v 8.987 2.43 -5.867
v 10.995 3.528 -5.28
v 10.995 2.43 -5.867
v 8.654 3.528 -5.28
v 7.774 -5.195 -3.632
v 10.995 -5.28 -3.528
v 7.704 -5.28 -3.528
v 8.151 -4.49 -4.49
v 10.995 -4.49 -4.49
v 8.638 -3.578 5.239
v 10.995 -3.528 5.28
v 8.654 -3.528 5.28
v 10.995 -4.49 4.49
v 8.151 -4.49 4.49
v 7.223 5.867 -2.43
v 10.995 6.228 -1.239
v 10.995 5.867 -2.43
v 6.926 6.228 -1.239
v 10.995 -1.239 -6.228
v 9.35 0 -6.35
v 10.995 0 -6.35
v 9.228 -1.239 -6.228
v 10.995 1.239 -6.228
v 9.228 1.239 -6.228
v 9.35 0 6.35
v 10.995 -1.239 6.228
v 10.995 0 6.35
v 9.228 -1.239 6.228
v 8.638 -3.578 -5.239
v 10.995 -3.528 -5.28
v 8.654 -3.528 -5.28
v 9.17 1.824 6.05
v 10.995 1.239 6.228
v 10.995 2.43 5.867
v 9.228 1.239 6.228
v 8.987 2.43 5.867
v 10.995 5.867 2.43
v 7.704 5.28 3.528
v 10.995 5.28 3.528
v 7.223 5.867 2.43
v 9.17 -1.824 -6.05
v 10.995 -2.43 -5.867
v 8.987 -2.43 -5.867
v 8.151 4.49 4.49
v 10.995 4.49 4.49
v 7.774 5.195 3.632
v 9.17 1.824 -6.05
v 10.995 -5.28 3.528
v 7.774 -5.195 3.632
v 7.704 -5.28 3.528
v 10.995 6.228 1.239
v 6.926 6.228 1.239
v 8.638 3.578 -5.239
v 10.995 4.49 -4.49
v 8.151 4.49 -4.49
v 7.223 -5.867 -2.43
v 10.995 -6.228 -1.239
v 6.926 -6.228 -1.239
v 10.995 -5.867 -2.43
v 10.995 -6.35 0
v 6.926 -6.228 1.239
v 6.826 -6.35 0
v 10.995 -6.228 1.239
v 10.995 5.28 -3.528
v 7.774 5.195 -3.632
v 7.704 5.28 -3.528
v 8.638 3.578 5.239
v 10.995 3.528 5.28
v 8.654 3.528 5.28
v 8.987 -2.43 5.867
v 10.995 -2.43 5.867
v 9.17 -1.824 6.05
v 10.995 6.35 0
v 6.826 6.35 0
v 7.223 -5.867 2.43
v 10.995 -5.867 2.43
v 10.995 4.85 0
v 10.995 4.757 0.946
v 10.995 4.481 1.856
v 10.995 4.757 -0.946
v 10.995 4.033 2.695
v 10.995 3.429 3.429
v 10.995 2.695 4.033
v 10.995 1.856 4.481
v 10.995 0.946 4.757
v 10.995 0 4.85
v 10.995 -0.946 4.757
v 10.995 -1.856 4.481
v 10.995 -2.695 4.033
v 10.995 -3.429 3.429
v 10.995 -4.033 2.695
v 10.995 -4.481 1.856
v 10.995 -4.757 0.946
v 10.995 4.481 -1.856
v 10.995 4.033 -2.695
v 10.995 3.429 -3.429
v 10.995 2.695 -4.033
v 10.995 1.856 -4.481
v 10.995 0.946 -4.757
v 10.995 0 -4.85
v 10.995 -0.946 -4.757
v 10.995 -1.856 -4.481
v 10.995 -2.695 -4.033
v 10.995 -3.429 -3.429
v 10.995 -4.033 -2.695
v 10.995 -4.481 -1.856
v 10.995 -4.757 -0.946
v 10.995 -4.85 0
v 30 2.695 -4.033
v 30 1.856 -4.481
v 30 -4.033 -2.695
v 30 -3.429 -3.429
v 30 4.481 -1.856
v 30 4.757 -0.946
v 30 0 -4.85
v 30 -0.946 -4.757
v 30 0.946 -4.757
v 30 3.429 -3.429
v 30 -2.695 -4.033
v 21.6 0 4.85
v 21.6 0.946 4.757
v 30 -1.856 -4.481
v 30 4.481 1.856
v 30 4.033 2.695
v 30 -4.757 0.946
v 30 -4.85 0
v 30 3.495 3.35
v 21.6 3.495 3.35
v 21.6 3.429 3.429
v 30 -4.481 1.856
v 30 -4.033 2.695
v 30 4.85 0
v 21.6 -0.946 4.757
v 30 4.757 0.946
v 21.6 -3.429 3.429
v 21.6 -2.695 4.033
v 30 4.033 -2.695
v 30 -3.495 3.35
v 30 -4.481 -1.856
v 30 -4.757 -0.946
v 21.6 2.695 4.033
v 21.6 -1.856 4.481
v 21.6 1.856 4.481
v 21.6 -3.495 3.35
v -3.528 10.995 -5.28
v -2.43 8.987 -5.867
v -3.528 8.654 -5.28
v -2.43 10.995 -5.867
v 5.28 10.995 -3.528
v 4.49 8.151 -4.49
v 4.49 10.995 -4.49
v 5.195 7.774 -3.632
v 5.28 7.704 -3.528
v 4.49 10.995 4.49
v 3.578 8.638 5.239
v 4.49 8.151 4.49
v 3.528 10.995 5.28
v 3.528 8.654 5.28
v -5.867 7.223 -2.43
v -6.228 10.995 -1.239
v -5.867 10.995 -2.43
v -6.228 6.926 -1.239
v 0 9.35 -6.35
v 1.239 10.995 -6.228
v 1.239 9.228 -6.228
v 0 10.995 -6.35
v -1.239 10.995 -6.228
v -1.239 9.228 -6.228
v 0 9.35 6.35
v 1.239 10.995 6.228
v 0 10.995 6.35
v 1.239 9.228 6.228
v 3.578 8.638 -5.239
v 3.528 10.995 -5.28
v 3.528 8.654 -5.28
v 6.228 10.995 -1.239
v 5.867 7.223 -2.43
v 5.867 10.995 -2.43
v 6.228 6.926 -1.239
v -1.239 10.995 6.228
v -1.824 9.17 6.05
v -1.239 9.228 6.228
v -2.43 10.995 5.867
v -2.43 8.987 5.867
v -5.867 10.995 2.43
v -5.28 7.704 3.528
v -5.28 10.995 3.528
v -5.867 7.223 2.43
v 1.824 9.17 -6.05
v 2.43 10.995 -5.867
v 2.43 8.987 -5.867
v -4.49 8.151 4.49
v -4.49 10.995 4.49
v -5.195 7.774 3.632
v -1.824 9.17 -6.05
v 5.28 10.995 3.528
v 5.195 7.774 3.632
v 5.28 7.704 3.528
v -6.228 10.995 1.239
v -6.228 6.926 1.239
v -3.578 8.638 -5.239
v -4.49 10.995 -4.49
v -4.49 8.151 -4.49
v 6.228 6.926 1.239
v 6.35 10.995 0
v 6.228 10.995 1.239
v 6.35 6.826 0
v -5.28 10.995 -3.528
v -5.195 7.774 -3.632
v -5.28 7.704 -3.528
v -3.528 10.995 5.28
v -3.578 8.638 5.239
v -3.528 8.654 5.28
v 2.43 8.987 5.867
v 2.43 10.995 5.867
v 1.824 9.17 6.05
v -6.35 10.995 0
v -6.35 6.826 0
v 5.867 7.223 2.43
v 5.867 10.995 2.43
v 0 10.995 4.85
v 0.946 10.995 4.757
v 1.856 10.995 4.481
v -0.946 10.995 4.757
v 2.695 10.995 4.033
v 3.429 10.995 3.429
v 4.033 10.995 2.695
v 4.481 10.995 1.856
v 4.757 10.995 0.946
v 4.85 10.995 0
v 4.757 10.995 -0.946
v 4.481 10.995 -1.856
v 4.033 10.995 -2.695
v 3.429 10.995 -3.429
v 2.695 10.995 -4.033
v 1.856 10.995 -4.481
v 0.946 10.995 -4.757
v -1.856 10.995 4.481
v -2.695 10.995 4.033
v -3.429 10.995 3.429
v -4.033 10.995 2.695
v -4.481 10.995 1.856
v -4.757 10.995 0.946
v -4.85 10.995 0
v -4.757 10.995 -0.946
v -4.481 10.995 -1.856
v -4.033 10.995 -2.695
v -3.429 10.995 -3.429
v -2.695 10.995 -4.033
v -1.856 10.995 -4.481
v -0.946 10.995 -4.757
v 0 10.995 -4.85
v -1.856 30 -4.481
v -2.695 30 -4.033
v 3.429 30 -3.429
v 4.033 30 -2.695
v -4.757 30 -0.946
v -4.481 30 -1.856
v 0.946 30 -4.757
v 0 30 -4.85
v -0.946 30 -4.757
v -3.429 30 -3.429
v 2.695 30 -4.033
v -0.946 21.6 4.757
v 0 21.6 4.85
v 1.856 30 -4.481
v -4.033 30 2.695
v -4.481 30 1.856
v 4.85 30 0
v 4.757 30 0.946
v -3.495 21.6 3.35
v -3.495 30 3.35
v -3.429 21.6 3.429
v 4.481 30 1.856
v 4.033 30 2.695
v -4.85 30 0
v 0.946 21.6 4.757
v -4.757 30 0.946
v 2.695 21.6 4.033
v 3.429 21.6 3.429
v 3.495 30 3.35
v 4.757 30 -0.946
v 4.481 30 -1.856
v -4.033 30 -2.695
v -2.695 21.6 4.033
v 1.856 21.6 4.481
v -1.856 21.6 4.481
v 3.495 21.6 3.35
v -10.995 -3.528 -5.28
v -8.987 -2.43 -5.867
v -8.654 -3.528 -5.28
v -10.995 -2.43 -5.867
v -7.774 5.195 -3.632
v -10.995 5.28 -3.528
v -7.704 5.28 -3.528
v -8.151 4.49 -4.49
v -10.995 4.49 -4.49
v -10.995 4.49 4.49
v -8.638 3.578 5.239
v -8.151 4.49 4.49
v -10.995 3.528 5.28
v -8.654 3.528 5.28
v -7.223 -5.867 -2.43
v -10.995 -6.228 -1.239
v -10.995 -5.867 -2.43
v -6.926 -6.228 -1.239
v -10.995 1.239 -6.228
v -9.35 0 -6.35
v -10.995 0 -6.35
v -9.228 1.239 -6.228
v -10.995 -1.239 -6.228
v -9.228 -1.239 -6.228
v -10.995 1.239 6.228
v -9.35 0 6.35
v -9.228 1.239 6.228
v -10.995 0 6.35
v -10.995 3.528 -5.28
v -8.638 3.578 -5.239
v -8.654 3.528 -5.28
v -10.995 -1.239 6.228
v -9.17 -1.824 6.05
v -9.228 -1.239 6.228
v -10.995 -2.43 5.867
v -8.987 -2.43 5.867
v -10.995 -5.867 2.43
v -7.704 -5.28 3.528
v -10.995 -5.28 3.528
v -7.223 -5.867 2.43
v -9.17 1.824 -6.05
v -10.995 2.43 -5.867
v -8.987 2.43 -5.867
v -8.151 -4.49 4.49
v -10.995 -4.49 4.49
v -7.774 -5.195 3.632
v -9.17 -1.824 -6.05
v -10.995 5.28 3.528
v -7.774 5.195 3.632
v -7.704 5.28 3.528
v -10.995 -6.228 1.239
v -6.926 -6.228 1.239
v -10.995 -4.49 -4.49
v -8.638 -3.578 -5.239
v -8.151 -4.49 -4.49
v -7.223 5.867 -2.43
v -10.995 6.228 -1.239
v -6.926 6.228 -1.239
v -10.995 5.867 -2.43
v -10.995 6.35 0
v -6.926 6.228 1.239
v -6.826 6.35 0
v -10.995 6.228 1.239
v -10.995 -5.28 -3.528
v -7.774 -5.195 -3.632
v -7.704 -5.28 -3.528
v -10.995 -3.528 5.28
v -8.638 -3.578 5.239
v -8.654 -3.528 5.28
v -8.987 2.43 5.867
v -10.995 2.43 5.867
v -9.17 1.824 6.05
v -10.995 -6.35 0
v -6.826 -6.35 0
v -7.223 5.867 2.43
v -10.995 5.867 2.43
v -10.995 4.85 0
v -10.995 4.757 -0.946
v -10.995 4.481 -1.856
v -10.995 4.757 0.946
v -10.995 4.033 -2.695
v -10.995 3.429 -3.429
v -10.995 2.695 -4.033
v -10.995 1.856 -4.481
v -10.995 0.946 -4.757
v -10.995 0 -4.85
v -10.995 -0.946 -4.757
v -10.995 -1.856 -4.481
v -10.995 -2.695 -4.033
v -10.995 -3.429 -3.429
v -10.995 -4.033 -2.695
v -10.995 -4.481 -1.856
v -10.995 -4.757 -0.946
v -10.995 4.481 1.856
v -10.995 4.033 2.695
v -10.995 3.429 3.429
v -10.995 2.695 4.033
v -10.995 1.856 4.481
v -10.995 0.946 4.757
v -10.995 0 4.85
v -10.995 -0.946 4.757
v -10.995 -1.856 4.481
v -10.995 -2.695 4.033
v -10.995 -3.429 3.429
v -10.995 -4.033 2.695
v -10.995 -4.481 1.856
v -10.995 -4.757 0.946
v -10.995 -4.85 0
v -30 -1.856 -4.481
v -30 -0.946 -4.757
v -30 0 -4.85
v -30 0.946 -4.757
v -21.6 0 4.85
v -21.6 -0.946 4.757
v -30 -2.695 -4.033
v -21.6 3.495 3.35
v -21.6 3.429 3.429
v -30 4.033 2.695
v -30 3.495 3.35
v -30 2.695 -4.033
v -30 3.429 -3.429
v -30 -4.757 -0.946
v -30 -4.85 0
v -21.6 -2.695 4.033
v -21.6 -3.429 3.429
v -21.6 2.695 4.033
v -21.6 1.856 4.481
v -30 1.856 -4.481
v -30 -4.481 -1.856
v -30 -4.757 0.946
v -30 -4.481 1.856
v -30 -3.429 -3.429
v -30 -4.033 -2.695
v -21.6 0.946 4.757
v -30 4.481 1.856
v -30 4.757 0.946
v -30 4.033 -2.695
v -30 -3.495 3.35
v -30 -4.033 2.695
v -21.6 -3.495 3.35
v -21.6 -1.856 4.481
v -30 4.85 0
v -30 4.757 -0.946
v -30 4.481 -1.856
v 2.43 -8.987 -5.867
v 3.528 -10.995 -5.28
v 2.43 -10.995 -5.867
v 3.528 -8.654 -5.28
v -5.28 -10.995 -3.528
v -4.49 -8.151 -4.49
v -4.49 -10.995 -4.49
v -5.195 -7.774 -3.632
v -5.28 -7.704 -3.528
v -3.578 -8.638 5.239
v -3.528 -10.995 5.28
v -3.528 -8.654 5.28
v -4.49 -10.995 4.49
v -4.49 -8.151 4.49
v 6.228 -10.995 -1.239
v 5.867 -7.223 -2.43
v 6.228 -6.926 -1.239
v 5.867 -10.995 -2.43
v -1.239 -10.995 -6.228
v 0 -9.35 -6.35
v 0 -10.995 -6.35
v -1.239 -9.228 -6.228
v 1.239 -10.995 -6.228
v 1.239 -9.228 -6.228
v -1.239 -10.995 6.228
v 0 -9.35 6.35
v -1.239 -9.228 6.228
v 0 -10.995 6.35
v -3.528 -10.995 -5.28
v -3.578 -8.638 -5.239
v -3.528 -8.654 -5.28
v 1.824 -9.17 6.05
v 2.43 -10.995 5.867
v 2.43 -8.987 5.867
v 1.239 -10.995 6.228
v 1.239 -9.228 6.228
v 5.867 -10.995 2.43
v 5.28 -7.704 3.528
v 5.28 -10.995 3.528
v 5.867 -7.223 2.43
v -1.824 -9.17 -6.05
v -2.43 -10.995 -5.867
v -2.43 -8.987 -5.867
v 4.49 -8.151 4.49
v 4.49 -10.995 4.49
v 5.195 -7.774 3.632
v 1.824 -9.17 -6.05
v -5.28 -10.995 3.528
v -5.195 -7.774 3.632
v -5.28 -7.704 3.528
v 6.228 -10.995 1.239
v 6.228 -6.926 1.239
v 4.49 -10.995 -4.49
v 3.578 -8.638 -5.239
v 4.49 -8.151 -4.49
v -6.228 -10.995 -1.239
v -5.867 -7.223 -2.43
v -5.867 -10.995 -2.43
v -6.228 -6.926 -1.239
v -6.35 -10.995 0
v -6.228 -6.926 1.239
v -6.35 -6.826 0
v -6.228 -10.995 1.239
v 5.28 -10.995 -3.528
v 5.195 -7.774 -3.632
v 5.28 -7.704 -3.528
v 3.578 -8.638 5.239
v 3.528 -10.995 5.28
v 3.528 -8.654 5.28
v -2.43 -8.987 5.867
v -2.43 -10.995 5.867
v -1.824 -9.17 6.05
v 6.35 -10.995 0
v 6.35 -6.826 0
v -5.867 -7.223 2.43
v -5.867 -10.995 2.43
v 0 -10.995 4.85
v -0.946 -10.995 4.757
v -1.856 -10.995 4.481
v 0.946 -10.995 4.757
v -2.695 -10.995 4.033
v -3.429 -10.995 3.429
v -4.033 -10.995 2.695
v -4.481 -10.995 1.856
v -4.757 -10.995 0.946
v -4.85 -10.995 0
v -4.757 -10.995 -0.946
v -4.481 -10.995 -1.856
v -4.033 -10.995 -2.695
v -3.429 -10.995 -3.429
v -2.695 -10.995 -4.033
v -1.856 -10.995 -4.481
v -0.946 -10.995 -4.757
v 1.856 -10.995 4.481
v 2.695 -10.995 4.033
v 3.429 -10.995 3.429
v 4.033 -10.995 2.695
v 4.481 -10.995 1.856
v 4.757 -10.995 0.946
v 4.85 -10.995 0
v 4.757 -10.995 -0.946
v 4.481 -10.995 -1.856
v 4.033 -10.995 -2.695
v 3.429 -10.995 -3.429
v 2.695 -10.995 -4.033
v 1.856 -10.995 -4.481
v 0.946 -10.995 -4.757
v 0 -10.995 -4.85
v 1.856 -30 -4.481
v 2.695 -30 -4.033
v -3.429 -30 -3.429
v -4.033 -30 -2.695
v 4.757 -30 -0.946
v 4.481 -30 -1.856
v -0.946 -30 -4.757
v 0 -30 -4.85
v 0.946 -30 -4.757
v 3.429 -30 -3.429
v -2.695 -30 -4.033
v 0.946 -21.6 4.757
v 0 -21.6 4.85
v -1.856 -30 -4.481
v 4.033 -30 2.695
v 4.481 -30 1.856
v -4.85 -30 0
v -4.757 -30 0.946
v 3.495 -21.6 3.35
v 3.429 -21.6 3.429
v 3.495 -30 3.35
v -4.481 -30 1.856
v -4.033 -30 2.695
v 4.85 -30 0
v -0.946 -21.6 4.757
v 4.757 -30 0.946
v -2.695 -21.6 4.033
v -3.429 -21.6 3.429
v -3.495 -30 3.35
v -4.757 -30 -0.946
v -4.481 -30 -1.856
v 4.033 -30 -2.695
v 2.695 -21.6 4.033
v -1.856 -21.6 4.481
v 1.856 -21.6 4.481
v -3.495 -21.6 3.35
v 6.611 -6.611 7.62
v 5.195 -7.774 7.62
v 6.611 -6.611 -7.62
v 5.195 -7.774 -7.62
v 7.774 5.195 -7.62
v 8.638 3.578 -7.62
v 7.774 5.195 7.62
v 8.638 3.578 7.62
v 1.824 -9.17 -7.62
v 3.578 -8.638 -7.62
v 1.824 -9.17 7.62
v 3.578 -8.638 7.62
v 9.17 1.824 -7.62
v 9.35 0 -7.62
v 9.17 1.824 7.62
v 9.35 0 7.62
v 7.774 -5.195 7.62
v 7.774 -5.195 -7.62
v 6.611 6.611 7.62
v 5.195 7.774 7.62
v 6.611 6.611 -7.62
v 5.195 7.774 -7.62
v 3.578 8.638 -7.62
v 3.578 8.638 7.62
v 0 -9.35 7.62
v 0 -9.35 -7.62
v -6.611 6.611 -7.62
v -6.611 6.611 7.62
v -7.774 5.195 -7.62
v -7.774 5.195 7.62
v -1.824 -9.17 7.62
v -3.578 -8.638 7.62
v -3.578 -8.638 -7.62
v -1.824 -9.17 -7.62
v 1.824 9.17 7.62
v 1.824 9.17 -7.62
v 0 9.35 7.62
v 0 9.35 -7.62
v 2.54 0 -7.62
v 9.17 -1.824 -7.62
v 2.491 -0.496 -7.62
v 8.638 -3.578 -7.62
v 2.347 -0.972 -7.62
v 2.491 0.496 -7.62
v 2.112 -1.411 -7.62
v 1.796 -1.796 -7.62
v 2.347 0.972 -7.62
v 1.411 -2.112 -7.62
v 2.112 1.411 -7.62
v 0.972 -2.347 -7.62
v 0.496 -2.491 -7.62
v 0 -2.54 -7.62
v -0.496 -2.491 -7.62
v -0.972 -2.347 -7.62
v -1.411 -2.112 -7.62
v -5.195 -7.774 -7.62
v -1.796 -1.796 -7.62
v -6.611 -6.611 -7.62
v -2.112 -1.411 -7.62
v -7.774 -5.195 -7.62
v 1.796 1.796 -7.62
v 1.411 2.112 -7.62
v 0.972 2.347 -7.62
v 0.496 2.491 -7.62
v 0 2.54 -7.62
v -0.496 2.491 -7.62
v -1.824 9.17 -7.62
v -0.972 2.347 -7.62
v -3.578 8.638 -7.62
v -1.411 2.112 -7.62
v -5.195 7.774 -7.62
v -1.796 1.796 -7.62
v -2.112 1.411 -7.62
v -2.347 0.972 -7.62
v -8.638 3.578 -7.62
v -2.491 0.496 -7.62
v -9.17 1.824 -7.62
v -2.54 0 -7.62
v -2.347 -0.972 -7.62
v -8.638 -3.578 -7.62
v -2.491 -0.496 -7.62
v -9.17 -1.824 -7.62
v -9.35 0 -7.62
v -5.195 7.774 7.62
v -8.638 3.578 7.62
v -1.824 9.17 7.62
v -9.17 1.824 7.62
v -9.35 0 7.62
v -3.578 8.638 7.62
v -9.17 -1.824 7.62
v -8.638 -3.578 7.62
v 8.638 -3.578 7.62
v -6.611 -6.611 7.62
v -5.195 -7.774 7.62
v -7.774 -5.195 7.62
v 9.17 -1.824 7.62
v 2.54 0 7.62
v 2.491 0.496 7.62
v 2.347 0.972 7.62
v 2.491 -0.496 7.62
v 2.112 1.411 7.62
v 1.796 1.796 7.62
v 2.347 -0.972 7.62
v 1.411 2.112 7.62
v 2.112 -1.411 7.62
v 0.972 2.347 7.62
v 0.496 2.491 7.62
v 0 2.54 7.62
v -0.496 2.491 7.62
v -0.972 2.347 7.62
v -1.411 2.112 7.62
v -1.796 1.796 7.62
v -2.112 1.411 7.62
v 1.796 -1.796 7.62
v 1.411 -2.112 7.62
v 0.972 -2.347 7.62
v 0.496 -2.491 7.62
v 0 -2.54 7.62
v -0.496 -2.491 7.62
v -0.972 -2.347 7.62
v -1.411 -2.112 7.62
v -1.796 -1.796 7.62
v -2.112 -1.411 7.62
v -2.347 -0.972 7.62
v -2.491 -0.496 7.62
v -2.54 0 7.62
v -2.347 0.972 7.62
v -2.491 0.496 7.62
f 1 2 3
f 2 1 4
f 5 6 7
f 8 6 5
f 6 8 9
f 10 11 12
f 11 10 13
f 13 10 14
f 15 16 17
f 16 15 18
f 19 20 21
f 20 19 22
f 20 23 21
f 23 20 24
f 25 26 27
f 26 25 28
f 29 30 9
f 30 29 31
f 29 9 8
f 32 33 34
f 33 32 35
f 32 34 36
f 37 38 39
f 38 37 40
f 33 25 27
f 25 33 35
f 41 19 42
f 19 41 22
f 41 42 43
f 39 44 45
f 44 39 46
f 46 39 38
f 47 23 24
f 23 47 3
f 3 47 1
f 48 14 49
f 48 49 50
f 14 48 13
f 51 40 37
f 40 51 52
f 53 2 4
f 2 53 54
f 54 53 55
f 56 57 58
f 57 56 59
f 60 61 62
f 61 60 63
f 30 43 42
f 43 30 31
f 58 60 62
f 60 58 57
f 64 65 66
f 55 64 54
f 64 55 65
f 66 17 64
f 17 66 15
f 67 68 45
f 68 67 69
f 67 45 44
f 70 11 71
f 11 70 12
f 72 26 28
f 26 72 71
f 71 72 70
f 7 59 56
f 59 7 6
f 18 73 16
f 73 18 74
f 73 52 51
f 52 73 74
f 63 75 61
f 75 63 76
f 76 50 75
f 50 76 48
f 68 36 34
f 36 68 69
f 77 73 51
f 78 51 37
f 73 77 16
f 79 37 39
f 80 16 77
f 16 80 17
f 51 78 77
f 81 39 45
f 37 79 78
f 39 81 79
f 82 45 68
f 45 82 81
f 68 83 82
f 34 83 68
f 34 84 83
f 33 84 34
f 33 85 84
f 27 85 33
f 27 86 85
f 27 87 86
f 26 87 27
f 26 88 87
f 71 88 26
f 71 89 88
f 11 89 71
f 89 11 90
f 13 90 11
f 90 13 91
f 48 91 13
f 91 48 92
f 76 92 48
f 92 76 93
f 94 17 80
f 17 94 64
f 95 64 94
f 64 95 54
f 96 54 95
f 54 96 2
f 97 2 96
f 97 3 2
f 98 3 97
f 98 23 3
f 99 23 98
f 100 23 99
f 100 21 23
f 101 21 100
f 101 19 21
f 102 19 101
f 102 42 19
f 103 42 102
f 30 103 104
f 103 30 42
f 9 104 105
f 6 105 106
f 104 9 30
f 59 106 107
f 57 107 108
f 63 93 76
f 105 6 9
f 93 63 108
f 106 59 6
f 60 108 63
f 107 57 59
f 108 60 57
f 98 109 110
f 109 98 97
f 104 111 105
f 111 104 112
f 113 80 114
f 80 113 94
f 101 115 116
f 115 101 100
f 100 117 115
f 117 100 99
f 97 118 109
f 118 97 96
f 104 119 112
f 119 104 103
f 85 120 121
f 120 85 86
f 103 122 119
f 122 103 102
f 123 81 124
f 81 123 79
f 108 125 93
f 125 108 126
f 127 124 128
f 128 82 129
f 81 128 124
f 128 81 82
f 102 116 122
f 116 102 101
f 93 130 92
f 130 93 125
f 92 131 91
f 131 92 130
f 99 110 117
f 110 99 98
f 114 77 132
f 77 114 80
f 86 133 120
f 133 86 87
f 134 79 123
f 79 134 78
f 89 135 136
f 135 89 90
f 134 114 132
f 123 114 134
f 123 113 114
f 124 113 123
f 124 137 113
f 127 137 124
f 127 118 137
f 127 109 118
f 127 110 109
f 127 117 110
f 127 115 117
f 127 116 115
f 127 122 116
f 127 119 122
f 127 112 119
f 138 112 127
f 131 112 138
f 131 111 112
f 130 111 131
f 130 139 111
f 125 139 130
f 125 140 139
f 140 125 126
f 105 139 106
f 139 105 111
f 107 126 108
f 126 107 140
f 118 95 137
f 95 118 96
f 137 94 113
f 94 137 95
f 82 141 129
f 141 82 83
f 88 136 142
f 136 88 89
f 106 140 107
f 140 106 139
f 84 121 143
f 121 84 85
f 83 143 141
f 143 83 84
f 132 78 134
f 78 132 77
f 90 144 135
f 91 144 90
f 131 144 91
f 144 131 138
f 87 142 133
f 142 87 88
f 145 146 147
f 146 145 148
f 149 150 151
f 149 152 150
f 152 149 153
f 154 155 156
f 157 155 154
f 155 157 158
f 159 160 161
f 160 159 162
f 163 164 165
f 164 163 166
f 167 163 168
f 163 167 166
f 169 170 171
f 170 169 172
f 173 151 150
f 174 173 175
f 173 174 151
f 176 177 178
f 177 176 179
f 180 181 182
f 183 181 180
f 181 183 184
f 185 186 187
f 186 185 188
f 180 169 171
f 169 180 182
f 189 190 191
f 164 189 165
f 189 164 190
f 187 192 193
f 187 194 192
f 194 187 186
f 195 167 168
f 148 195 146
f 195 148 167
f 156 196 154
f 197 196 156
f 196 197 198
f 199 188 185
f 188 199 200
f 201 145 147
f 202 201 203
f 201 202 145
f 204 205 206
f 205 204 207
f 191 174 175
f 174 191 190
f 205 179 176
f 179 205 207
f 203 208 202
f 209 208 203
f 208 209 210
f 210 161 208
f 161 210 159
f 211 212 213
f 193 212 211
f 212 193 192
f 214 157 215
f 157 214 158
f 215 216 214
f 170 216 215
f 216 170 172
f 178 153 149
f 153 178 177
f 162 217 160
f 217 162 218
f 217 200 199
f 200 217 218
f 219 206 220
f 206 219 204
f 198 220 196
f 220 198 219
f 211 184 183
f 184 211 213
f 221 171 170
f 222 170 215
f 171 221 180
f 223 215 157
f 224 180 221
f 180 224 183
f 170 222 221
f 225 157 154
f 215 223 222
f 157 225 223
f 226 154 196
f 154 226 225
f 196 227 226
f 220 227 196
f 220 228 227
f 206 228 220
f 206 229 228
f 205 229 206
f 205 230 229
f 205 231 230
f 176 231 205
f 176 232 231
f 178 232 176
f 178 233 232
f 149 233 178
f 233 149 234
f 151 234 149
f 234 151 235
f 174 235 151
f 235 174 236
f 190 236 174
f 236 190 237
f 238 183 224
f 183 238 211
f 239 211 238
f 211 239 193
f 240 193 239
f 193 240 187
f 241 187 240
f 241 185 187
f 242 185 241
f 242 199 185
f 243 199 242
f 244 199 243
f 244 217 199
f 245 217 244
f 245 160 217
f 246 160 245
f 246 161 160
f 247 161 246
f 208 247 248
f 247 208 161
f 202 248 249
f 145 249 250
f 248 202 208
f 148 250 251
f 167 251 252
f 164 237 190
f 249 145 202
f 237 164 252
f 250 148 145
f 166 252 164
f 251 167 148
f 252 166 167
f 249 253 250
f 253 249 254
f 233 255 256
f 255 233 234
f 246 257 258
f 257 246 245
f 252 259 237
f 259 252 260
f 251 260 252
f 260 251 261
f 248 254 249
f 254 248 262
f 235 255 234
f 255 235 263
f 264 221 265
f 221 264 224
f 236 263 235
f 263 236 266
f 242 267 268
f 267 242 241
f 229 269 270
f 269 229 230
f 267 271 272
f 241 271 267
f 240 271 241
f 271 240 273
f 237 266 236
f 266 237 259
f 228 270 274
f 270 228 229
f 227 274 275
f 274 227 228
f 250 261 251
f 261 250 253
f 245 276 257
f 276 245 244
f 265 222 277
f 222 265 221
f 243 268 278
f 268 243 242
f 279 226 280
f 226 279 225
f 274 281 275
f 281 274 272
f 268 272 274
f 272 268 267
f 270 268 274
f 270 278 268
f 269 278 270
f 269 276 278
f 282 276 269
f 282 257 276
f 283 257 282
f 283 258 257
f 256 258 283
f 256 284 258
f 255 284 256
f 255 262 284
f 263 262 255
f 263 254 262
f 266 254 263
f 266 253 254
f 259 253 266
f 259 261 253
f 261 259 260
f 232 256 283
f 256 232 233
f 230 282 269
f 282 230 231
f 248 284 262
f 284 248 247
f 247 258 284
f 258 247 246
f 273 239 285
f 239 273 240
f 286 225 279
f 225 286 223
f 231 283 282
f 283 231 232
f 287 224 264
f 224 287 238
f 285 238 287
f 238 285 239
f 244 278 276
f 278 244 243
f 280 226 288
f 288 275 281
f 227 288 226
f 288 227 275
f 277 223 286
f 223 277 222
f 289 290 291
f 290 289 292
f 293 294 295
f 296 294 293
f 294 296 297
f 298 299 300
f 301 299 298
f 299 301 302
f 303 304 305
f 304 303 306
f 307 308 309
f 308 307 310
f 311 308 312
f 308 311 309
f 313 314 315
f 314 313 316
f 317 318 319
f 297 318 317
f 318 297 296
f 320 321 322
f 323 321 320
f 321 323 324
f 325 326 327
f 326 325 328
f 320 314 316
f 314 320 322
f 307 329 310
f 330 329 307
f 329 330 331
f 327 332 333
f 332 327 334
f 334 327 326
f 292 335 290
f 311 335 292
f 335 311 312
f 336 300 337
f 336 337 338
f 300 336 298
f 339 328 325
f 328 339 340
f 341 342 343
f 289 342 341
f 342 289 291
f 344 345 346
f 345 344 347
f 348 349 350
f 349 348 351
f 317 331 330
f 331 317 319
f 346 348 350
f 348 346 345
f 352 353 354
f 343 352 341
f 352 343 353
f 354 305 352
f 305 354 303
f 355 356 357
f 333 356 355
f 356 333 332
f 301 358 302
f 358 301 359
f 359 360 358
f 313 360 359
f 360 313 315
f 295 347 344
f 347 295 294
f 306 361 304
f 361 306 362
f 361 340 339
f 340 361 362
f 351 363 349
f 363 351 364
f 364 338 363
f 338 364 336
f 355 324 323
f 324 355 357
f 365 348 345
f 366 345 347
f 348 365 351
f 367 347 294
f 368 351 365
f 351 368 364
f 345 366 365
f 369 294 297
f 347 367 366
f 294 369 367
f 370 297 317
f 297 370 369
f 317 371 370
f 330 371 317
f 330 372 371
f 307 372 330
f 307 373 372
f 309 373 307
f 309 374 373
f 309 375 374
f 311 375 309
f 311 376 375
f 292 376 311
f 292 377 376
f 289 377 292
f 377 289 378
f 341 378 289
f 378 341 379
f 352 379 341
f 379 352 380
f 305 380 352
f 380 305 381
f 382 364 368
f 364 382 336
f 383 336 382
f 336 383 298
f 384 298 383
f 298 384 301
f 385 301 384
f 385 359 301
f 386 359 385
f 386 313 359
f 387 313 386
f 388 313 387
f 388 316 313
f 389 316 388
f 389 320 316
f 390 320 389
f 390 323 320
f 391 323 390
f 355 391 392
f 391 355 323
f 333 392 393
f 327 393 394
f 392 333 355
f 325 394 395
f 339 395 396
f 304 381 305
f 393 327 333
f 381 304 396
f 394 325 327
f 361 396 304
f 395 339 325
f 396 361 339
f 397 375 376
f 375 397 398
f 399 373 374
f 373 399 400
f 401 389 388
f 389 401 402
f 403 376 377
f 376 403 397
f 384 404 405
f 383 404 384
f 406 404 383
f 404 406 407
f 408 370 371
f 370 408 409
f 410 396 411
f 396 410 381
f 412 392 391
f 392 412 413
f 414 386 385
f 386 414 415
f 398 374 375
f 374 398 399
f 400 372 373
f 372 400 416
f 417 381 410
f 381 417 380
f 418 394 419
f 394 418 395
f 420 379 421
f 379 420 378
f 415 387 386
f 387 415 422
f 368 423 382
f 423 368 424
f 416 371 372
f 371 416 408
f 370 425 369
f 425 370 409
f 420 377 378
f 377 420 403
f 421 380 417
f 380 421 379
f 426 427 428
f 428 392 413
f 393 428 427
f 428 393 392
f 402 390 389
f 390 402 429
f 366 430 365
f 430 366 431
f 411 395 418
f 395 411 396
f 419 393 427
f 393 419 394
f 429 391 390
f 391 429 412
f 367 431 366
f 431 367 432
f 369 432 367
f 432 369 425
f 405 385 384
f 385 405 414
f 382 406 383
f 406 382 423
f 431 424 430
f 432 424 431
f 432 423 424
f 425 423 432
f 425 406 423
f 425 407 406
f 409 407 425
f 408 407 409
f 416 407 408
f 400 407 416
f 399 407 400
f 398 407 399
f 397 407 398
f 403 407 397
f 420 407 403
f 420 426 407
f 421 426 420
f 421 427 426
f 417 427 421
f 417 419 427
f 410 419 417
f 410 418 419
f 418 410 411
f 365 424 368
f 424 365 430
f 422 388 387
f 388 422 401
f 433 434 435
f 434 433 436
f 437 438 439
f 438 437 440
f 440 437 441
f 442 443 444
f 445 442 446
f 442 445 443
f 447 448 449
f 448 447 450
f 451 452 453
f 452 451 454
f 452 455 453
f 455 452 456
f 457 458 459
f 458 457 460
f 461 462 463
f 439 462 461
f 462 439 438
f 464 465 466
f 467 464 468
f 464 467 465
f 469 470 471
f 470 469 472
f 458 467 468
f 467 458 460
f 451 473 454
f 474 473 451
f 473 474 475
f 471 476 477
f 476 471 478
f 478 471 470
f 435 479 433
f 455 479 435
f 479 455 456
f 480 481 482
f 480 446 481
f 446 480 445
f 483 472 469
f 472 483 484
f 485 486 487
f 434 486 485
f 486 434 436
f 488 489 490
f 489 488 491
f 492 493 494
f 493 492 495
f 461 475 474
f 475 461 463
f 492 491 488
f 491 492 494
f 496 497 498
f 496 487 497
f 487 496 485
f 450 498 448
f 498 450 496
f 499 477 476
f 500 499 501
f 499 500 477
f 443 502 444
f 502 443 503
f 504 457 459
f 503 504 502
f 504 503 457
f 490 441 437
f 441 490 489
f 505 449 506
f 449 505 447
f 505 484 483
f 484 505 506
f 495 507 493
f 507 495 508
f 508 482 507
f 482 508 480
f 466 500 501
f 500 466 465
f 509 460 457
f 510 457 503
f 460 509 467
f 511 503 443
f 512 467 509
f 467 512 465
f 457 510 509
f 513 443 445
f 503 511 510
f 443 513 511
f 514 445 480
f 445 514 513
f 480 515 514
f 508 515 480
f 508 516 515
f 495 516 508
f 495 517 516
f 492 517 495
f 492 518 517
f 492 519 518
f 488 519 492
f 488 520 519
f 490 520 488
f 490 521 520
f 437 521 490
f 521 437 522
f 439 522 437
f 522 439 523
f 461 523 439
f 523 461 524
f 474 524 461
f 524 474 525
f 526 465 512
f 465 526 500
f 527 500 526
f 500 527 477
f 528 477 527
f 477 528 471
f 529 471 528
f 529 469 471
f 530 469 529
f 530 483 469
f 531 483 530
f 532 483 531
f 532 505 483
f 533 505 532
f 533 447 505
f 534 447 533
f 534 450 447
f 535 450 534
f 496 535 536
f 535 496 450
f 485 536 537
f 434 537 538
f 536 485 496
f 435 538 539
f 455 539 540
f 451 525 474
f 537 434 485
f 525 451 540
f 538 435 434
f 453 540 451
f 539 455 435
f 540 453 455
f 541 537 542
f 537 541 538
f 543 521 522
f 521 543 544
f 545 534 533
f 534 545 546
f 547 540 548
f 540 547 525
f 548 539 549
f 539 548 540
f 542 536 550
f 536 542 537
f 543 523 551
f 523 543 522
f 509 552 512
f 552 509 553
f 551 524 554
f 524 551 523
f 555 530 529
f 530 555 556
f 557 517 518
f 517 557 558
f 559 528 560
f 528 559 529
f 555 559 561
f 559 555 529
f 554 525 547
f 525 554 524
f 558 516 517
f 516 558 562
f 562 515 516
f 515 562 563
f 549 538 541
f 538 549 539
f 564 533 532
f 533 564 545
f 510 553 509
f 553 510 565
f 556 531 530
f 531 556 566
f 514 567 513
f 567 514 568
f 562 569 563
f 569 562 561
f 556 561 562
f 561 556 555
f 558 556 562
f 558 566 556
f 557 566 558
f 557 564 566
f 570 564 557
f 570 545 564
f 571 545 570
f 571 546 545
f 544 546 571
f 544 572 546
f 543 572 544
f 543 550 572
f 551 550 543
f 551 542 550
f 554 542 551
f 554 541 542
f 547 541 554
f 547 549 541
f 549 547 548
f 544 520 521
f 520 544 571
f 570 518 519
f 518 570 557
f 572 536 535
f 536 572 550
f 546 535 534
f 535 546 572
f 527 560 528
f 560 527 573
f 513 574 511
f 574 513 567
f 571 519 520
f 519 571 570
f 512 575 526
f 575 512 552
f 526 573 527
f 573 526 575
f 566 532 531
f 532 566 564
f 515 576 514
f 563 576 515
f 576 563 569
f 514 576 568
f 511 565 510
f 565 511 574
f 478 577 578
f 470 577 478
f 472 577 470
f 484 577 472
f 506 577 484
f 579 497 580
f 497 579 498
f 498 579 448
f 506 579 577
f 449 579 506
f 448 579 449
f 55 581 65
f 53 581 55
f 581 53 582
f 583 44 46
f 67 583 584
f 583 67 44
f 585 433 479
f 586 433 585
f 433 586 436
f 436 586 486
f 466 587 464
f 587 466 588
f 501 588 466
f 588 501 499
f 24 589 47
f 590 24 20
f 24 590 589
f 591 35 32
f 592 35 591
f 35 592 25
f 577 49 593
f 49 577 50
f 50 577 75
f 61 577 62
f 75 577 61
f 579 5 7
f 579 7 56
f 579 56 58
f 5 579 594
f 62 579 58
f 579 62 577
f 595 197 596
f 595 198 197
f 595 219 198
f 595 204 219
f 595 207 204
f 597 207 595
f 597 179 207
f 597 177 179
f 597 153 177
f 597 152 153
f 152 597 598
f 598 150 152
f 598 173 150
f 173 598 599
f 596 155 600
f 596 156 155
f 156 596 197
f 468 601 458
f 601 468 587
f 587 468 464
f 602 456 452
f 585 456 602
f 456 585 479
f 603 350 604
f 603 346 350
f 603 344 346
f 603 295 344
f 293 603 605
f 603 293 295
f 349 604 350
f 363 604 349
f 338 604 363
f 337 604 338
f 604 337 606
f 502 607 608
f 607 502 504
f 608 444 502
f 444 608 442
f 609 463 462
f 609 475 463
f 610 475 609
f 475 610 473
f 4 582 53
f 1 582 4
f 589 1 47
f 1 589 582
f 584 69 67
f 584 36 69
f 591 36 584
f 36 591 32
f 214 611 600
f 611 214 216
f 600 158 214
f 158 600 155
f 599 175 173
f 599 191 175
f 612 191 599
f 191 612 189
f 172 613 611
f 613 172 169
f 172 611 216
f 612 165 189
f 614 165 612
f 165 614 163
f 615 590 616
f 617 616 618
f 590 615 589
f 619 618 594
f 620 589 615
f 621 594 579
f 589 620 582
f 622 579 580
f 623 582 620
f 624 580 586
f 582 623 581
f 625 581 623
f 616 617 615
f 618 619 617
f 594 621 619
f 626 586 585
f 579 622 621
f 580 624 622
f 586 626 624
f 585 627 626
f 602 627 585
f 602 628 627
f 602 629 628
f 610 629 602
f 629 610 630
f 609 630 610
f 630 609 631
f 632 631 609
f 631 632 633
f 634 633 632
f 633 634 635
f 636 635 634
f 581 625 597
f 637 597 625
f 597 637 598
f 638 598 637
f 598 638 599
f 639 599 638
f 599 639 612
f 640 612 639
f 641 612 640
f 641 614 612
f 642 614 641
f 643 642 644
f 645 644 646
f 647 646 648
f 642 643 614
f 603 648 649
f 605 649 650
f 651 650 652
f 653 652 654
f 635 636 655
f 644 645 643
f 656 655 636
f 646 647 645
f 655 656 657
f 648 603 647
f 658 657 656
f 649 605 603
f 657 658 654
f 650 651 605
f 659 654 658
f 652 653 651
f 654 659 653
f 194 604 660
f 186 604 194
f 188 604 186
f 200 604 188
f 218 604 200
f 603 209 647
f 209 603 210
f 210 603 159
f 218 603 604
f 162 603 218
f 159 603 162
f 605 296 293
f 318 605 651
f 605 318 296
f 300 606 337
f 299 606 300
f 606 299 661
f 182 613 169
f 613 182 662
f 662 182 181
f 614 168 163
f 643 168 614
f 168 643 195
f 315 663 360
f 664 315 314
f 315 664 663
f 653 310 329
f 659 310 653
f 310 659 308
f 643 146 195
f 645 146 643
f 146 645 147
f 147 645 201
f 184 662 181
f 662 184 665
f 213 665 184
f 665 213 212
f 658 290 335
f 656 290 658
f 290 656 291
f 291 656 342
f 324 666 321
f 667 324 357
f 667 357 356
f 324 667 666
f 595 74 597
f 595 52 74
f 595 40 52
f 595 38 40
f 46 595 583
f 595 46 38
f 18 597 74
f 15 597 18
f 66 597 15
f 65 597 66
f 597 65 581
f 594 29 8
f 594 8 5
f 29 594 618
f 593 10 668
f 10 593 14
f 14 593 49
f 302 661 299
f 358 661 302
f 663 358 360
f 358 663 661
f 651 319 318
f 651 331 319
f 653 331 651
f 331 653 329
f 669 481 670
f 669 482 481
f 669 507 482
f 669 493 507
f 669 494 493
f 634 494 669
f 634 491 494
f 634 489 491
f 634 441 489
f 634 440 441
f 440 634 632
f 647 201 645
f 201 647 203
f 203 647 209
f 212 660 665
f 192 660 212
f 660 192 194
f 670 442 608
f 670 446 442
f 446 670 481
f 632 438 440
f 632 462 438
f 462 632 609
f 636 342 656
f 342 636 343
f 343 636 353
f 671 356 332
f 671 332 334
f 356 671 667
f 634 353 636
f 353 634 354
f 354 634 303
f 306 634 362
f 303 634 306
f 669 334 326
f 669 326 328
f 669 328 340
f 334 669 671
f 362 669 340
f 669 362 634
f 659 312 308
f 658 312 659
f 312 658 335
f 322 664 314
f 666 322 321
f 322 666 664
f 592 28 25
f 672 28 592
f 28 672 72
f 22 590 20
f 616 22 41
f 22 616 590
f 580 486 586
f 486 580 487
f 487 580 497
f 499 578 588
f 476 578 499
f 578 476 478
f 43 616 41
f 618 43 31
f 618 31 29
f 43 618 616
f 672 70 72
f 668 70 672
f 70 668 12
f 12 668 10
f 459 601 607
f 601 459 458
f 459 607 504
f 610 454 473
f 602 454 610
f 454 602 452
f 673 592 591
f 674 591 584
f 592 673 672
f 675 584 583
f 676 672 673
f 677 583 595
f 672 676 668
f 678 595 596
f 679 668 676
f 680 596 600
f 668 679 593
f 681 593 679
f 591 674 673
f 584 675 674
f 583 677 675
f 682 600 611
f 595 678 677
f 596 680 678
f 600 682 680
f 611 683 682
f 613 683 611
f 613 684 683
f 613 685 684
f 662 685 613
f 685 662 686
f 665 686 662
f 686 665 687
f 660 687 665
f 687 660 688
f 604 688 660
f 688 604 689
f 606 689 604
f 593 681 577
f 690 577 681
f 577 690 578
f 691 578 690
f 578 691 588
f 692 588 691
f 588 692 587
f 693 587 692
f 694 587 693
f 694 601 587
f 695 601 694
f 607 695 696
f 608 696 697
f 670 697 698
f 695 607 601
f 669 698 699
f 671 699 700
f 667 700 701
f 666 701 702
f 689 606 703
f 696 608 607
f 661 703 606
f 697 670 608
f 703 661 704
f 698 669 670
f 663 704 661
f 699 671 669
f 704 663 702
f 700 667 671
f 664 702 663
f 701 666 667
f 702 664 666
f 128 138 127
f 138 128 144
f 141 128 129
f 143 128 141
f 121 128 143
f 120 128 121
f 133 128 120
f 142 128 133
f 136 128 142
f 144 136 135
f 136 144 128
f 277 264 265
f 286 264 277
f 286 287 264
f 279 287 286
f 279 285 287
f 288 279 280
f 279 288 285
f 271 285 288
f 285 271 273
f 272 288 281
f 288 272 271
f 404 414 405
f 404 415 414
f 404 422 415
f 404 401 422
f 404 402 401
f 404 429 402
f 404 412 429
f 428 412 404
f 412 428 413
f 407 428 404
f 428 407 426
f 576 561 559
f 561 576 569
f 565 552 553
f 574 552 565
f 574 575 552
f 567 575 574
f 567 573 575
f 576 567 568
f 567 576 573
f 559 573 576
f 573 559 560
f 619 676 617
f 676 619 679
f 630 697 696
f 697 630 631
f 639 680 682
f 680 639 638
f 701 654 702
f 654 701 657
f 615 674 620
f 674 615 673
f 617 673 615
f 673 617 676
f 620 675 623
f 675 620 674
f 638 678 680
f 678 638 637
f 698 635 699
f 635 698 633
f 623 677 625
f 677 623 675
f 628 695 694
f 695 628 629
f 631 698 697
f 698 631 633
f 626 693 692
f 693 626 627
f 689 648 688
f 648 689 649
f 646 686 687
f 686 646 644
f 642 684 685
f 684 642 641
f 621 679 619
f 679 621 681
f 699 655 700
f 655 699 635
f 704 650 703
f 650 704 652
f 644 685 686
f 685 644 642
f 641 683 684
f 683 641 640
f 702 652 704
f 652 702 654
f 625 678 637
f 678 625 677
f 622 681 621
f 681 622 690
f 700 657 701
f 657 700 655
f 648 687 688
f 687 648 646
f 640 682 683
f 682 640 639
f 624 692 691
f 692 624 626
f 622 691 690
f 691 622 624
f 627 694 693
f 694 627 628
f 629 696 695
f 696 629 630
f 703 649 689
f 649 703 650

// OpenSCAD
$fn = 32;

// ----------------------------------------------------------------------
// Cardan cross: 60 mm span, 12.7 mm trunnions
// ----------------------------------------------------------------------

// --- parameters (mm) ---
journal_d = 12.7;         // trunnion diameter
arm_len = 30;             // trunnion length from the centre
step_r = 4.32;            // step position from the centre
step_d = 9.7;             // journal diameter after the step
hub_d = 18.7;             // hub diameter
hub_h = 15.24;            // hub height
bore_d = 5.08;            // hub bore
flat_d = 1.5;             // depth of the journal flat
flat_len = 8.4;           // length of the journal flat

difference() {
  union() {
    /* hub along the joint axis */
    cylinder(h = hub_h, d = hub_d, center = true);
    for (a = [0 : 90 : 270]) rotate([0, 0, a]) {
      /* trunnion, sunk into the hub */
      translate([hub_d / 4, 0, 0]) rotate([0, 90, 0]) cylinder(h = step_r + 2, d = journal_d);
      /* stepped journal out to the tip */
      translate([step_r - 0.5, 0, 0]) rotate([0, 90, 0]) cylinder(h = arm_len + 0.5 - step_r, d = step_d);
    }
  }
  /* lubrication bore through the hub, 2.5 mm clear on both sides */
  translate([0, 0, -hub_h / 2 - 2.5]) cylinder(h = hub_h + 5, d = bore_d);
  /* machined flat on each journal tip */
  for (a = [0 : 90 : 270]) rotate([0, 0, a]) {
    translate([arm_len - flat_len, -step_d, step_d / 2 - flat_d]) cube([flat_len + 0.5, 2 * step_d, flat_d + 2.5]);
  }
}
